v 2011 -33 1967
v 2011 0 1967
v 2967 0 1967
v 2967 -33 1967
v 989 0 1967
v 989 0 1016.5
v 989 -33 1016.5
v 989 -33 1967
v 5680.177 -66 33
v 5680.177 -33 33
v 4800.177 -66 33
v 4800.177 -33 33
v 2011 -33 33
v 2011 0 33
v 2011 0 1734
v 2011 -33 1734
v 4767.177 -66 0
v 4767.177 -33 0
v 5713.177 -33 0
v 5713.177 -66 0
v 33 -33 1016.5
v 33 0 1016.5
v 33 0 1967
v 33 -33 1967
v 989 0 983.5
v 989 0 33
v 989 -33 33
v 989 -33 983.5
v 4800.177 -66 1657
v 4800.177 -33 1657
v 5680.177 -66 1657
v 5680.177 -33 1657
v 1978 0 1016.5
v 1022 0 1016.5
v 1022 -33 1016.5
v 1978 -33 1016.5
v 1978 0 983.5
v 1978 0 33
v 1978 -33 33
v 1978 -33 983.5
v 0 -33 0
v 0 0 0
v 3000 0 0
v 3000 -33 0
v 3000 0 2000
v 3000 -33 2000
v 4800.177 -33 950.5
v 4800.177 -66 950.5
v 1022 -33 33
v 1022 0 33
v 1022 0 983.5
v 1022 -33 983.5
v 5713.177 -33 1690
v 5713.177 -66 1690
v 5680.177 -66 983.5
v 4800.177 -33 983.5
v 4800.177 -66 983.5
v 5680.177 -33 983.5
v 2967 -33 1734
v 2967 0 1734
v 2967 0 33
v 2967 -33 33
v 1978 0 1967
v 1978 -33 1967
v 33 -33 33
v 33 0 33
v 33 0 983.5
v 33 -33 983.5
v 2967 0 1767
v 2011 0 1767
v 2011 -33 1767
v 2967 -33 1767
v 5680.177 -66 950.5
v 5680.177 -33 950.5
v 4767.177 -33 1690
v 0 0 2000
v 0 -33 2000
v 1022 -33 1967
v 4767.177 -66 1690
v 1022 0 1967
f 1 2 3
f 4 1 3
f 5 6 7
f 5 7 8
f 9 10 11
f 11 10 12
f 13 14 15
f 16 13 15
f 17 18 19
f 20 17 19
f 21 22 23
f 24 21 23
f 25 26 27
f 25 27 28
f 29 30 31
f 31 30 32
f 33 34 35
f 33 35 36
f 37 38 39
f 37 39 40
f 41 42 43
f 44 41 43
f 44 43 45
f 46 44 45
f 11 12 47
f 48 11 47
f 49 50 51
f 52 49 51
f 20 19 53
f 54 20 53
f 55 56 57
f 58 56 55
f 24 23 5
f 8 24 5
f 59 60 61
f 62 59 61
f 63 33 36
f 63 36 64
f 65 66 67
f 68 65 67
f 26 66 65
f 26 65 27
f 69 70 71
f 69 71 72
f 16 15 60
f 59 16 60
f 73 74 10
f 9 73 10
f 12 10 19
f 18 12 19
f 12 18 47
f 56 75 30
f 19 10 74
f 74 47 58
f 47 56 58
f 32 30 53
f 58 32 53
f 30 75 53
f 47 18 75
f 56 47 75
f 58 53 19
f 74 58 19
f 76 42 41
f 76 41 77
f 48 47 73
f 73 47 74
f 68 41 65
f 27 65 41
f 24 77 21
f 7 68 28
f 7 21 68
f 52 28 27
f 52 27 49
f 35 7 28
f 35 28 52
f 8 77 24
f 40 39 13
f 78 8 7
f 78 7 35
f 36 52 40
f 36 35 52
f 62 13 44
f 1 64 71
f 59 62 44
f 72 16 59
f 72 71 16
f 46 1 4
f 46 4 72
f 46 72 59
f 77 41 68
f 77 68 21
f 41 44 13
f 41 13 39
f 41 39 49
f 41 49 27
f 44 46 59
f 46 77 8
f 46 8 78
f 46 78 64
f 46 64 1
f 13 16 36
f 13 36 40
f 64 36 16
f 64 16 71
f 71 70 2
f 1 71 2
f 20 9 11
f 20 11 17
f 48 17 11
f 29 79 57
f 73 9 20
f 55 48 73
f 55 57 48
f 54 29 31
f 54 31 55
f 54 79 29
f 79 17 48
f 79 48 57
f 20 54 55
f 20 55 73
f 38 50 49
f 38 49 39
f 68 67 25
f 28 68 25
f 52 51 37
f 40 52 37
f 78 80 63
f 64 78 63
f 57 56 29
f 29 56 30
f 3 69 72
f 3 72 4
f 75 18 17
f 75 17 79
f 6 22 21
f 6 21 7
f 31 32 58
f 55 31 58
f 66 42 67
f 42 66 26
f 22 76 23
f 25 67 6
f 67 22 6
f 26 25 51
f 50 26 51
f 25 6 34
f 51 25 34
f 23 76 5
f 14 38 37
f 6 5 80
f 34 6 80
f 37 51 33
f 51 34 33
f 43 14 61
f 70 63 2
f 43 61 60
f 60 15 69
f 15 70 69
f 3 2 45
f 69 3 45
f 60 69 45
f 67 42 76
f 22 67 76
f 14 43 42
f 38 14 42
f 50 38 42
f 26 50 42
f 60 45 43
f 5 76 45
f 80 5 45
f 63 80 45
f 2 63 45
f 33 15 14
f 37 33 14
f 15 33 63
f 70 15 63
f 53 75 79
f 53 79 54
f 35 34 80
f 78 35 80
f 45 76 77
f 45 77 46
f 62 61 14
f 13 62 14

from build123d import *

# Parameters (mm, degrees)
F0_W     = 3000
F0_H     = 2000
F0_W_2   = 956
F0_H_2   = 950.5
F0_H_3   = 200
F1_DEPTH = 33
F2_W     = 946
F2_H     = 1690
F2_W_2   = 880
F2_H_2   = 33
F3_DEPTH = 33


# Not quite as in the source:
# - a feature names something its author has since deleted; it is built from what else it names


with BuildPart() as f1:
    # F0 (on Front) → F1 (new body)
    with BuildSketch(Plane.XZ):
        with Locations((1500, 1000)):
            Rectangle(F0_W, F0_H)
        with Locations((511, 508.25)):
            Rectangle(F0_W_2, F0_H_2, mode=Mode.SUBTRACT)
        with Locations((1500, 508.25)):
            Rectangle(F0_W_2, F0_H_2, mode=Mode.SUBTRACT)
        Polygon((2967, 33), (2011, 33), (2011, 1734), (2967, 1734), (2967, 1016.5), (2967, 983.5), align=None, mode=Mode.SUBTRACT)
        with Locations((511, 1491.75)):
            Rectangle(F0_W_2, F0_H_2, mode=Mode.SUBTRACT)
        with Locations((1500, 1491.75)):
            Rectangle(F0_W_2, F0_H_2, mode=Mode.SUBTRACT)
        with Locations((2489, 1867)):
            Rectangle(F0_W_2, F0_H_3, mode=Mode.SUBTRACT)
    extrude(amount=F1_DEPTH)


with BuildPart() as f3:
    # F2 (on face) → F3 (new body)
    with BuildSketch(Plane.XZ.offset(33)):
        with Locations((5240.176655467, 845)):
            Rectangle(F2_W, F2_H)
        Polygon((4800.176655467, 983.5), (4800.176655467, 1657), (5680.176655467, 1657), (5680.176655467, 983.5), (5680.176655467, 950.5), (5680.176655467, 33), (4800.176655467, 33), (4800.176655467, 950.5), align=None, mode=Mode.SUBTRACT)
        with Locations((5240.176655467, 967)):
            Rectangle(F2_W_2, F2_H_2)
    extrude(amount=F3_DEPTH)


solid = Compound([f1.part, f3.part])
